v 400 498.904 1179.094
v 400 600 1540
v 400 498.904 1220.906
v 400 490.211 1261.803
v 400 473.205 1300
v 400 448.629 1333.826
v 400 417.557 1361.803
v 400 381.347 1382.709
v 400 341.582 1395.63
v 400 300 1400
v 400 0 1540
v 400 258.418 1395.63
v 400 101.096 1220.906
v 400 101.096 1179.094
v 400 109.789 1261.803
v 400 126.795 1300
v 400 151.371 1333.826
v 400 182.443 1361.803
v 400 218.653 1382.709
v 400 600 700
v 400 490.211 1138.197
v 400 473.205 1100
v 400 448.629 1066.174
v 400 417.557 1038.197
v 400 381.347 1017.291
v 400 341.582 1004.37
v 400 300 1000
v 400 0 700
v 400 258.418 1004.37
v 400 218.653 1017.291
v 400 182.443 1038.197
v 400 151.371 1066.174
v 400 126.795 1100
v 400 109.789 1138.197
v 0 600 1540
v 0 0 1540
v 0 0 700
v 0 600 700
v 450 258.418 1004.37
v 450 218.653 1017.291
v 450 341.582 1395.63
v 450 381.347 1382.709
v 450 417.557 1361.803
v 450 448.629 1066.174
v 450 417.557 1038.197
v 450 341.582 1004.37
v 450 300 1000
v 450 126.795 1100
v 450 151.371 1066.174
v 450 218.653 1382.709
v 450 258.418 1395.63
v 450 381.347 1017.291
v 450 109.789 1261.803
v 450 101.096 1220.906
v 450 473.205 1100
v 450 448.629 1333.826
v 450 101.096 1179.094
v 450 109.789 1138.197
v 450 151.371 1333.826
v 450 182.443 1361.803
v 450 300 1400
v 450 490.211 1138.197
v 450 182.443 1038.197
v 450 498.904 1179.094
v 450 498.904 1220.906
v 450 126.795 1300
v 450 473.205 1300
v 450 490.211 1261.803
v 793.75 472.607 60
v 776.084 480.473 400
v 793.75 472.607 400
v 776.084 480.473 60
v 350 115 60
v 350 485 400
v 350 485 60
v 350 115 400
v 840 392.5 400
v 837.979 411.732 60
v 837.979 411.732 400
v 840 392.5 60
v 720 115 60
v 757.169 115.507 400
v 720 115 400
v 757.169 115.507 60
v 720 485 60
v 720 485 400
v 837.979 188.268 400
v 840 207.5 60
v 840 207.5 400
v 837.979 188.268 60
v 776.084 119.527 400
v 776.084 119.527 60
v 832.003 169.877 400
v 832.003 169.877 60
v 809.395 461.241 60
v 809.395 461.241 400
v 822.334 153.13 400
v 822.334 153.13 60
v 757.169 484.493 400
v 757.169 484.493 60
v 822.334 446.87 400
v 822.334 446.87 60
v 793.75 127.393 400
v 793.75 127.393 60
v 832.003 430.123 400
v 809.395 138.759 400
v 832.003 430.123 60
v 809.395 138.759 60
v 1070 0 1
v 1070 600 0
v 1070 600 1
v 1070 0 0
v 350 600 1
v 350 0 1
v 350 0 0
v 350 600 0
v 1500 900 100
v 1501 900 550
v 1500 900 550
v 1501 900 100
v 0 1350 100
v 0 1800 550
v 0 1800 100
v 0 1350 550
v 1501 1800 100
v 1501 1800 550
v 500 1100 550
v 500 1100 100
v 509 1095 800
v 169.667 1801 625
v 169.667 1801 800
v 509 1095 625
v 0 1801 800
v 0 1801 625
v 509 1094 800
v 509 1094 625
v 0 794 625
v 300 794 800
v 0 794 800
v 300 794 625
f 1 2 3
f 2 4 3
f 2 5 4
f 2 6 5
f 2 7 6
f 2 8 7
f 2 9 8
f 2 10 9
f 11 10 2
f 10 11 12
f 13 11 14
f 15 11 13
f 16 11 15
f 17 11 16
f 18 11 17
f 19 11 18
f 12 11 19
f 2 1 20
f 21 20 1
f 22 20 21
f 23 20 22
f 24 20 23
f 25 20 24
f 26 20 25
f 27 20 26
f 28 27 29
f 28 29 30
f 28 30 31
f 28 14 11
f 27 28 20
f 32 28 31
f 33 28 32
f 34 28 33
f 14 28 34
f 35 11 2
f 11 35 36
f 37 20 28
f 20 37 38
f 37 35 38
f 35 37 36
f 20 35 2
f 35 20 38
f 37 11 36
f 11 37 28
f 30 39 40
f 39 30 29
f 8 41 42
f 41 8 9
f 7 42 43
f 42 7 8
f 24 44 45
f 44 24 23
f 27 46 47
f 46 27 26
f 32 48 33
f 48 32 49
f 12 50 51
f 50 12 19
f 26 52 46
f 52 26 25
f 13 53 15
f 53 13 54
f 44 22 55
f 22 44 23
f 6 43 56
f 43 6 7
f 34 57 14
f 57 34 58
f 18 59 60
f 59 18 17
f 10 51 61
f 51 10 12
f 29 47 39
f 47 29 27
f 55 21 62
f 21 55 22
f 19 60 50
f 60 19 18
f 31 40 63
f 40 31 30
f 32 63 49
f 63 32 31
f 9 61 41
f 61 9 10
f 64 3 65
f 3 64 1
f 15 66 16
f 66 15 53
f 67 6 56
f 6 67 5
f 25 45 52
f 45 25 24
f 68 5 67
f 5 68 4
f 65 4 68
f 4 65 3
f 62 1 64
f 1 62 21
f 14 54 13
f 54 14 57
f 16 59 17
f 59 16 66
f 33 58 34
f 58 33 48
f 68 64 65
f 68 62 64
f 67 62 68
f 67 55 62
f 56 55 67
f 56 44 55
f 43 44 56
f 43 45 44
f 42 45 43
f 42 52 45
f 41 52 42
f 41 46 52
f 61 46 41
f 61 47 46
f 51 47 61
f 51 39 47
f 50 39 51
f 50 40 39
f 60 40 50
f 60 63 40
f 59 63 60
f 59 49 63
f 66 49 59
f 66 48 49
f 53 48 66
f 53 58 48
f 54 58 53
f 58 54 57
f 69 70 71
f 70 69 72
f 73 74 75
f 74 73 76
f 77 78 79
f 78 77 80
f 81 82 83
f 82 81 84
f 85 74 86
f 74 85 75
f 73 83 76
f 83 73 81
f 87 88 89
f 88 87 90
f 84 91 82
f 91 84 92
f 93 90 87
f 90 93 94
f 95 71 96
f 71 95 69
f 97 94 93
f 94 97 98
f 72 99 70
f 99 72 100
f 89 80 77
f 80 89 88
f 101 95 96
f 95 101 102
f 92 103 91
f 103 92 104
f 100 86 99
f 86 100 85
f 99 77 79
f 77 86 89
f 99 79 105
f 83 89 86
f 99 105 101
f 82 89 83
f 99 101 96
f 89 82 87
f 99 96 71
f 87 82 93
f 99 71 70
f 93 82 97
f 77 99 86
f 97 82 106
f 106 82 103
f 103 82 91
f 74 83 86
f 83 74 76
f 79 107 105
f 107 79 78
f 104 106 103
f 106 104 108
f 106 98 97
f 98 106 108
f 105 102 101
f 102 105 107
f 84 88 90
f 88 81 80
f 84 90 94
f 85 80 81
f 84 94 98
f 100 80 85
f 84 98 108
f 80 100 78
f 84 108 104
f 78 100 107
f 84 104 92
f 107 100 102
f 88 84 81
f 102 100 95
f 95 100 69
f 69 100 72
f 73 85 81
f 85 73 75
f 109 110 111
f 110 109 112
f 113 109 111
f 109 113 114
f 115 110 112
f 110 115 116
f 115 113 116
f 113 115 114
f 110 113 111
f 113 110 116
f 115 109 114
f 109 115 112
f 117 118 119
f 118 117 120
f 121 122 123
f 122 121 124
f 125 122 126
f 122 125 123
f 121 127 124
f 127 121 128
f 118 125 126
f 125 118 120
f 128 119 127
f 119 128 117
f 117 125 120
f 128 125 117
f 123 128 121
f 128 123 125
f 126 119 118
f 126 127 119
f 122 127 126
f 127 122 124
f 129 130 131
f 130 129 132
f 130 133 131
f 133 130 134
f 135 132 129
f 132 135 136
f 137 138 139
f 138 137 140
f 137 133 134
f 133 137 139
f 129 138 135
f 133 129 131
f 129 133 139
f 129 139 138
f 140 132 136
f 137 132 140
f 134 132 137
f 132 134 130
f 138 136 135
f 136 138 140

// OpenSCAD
L=1800;
W=1500;
H=2450;

%cube([W,L,1]);
%cube([1,L,H]);
%translate([0,L,0])cube([W,1,H]);


level=150;

translate([0,0,700]) washer();

translate([0,L-900,100]) tube();
translate([0,L-1006,800-175]) sink();

translate([350,300-370/2, 0]) wc();
//translate([370/1.4,370*(0), level]) rotate([0,0,45]) wc();
//%translate([0,0,level-25]) cube([370+350,1000,25]);

// door
%difference(){
    translate([0,-100,0])cube([W,100,H]);
    translate([850,-110,0]) cube([600,150,2000]);
}

module washer(){
    cube([400,600,840]);
    translate([0,300,500]) rotate([0,90,0]) cylinder(h=450,r=200);
}


// https://i.sdvk.ru/i/Art-Max/RIMINI-AM204CHR-CHasha-unitaza-podvesnogo-bezobodkovogo-234851/356502.jpg
module wc(){
    
    translate([0,0,60])hull(){
        cube([370,370,340]);
        for(i=[-1,1]) translate([490-370/4,i*(370/4)+370/2]) 
            cylinder(h=340,r=370/4);
    }
    
    translate([0,-300+370/2,0]) cube([370+350,600,1]);
}

module tube(){
    w=[450,700,900];
    x=[0,500,1500];
    hull(){
        for(i=[0:2]) translate([x[i],900-w[i],0]) cube([1,w[i],450]);
    }
}

module sink(){
    w=[300,509,509/3];
    x=[0,300,1006];
    color([1,1,1,0.4])
    hull(){
        for(i=[0:2]) translate([0,x[i],0]) cube([w[i],1,175]);
    }
}
